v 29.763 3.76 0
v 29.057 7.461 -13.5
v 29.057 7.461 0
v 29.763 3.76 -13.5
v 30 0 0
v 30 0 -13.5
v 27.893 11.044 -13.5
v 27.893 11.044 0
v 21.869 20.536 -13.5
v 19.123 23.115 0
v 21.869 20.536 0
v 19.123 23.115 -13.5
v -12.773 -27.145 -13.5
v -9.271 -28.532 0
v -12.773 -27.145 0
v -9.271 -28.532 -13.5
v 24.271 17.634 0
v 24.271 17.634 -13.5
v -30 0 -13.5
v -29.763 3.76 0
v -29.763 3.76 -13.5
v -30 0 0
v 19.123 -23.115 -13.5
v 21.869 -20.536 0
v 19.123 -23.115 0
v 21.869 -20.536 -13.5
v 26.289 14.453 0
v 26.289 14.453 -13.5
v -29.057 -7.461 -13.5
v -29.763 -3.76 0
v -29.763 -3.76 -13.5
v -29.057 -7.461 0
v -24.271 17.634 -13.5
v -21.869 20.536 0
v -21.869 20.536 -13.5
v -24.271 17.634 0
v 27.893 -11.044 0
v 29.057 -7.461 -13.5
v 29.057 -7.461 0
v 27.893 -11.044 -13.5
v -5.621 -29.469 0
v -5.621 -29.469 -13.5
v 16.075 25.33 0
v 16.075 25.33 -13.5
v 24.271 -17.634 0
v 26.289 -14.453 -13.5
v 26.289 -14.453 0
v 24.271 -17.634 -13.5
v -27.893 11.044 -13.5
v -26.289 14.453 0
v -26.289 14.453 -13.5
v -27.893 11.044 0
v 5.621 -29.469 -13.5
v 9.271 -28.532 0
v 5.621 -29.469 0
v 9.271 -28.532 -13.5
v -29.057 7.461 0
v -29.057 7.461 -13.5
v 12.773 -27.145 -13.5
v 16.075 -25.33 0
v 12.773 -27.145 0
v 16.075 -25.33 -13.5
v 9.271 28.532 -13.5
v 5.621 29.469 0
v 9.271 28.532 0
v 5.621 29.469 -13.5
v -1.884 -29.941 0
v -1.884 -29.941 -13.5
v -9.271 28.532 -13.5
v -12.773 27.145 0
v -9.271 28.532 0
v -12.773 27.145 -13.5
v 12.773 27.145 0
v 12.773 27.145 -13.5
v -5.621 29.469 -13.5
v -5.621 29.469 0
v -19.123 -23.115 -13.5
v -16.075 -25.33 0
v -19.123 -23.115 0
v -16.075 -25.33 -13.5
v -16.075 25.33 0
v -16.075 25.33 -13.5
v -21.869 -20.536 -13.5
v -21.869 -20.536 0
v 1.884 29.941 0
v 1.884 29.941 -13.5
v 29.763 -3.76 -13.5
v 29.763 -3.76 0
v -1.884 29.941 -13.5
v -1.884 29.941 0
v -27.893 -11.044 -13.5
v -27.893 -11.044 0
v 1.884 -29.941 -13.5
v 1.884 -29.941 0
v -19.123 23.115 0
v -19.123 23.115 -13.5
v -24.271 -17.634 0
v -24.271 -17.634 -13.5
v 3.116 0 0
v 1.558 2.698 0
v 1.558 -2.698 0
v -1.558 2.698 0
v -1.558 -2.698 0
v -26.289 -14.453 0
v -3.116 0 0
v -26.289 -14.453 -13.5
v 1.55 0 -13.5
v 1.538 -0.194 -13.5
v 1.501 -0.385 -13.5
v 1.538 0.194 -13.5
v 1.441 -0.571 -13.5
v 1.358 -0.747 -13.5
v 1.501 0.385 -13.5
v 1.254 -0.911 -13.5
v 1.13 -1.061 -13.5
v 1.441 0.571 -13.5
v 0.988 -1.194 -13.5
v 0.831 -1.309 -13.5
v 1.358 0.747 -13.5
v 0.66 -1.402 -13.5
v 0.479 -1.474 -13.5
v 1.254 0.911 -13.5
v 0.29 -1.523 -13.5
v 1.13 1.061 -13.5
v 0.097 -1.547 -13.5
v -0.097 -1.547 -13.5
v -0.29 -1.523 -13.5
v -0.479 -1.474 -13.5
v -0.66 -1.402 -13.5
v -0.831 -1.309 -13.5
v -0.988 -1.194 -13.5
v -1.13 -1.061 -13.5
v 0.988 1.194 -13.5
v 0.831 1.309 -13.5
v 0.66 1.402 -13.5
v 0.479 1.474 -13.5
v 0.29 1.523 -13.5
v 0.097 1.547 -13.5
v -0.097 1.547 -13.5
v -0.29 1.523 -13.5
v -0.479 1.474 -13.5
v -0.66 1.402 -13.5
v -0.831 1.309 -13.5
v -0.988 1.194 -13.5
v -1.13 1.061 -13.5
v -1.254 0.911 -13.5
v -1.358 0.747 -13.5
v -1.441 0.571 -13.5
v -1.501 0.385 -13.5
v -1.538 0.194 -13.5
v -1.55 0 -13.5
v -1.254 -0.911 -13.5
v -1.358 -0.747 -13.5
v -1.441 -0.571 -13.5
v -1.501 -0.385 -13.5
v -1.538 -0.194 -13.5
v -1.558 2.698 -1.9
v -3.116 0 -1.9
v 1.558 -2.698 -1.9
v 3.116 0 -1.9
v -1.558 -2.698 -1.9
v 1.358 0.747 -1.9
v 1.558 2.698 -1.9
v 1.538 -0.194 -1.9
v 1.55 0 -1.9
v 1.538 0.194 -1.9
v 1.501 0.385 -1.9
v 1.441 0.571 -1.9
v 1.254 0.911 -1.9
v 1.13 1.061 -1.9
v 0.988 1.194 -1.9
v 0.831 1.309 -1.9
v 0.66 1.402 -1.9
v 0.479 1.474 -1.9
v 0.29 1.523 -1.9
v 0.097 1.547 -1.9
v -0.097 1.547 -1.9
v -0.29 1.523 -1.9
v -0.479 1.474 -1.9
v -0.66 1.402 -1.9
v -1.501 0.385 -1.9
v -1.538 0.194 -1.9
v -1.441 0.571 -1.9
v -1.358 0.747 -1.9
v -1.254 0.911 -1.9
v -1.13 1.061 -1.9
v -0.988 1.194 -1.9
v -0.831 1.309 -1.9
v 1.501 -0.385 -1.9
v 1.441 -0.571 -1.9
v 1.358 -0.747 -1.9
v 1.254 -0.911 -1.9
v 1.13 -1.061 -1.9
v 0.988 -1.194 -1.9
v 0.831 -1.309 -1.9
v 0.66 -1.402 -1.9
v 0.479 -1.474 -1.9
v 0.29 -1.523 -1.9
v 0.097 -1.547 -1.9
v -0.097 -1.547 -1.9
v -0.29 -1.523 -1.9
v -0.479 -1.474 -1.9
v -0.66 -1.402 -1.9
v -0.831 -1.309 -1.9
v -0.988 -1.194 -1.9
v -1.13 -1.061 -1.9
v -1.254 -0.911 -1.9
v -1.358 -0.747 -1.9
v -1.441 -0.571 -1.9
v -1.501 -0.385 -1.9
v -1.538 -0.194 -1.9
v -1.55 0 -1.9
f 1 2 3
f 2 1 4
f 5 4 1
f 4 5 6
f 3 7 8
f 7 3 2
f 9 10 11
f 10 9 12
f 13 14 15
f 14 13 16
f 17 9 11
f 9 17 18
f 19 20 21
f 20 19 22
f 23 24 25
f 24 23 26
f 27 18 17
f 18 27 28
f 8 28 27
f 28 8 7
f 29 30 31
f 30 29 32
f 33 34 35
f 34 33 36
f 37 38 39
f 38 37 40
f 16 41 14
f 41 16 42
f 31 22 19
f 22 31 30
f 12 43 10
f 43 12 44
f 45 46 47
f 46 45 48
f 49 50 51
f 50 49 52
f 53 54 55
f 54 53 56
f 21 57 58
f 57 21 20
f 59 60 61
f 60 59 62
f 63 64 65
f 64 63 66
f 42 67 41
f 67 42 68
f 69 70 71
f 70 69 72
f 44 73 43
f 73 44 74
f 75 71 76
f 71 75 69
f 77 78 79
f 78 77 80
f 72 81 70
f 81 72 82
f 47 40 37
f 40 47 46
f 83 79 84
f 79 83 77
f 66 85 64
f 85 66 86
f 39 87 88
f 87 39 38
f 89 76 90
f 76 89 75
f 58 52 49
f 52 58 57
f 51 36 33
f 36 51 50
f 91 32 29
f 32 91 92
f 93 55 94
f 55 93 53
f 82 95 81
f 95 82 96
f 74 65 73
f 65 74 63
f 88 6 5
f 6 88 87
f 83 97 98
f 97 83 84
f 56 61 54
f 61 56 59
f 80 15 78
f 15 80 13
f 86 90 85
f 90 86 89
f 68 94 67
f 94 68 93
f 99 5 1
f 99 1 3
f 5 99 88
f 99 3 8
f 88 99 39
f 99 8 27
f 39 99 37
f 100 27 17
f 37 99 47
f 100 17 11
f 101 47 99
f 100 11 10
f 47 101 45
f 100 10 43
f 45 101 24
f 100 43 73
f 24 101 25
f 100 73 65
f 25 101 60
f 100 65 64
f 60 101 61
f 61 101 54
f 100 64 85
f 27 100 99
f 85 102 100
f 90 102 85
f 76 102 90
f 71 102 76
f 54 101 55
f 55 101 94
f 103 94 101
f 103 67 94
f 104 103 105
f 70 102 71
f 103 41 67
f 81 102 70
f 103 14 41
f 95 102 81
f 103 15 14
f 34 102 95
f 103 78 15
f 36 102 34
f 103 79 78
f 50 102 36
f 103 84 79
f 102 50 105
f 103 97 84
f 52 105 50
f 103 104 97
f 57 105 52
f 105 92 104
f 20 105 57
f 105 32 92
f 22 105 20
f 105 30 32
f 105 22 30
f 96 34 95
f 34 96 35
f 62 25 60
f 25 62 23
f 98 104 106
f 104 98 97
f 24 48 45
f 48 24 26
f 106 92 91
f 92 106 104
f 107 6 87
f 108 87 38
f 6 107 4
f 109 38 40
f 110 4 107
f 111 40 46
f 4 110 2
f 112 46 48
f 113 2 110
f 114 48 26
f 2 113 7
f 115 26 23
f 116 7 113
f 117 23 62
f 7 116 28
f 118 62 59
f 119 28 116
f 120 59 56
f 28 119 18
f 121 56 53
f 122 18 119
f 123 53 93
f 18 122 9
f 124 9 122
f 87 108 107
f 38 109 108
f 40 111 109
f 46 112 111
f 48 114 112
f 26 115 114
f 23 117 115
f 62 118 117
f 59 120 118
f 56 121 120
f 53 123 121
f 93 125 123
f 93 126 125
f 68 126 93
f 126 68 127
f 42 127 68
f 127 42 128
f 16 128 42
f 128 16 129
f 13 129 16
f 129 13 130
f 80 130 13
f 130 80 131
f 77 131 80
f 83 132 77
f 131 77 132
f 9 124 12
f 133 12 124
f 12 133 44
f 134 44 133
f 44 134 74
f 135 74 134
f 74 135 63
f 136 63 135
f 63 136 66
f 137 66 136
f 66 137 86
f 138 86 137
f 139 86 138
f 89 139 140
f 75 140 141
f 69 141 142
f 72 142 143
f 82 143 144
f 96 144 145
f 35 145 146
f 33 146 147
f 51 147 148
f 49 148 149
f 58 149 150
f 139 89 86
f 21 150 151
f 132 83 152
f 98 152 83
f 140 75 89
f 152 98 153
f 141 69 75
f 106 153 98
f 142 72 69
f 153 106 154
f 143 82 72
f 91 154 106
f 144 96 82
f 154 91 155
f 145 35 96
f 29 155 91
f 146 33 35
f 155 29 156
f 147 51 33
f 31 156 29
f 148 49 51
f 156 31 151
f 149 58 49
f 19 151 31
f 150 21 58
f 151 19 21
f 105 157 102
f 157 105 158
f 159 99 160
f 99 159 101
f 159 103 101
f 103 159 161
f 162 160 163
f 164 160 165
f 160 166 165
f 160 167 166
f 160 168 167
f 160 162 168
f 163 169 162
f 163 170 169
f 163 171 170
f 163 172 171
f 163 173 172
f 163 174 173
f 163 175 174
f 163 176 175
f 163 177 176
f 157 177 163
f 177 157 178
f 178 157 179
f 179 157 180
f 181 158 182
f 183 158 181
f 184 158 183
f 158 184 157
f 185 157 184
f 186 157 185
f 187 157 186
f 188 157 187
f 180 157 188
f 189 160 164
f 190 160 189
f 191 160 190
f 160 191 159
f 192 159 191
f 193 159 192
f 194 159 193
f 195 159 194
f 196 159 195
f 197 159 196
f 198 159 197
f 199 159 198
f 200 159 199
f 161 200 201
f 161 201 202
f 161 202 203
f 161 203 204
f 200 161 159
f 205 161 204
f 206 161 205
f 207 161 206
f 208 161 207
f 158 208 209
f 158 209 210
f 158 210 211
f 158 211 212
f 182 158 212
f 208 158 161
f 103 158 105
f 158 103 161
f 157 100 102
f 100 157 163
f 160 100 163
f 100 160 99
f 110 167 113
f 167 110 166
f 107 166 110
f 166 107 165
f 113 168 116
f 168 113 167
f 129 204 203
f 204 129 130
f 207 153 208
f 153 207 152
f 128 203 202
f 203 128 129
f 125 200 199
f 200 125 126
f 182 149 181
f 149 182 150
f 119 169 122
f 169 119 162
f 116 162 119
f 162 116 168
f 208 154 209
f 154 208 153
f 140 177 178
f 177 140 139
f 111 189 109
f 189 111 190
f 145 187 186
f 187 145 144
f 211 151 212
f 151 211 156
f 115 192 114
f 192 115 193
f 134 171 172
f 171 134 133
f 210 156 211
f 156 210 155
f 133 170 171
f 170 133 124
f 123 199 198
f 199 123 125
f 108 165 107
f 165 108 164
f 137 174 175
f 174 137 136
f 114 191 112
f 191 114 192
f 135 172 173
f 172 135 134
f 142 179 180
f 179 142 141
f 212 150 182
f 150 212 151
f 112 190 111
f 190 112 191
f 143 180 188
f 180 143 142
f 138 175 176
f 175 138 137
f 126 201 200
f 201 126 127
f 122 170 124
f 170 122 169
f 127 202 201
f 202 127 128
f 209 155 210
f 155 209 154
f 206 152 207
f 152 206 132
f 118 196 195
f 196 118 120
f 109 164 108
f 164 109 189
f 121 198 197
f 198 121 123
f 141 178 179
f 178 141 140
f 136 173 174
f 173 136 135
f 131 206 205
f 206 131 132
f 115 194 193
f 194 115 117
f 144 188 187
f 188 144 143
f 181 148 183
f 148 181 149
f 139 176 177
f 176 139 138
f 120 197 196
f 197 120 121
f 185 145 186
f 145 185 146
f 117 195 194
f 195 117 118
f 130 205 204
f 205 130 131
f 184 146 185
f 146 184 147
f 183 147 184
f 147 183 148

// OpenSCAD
$fn = 50;


difference() {
	union() {
		translate(v = [0, 0, -13.5000000000]) {
			cylinder(h = 13.5000000000, r = 30.0000000000);
		}
		translate(v = [0, 0, -12.0000000000]) {
			cylinder(h = 12, r = 2.8750000000);
		}
	}
	union() {
		translate(v = [0, 0, 0]) {
			rotate(a = [0, 0, 0]) {
				difference() {
					union() {
						translate(v = [0, 0, -1.9000000000]) {
							linear_extrude(height = 1.9000000000) {
								polygon(points = [[3.1158000000, 0.0000000000], [1.5579000000, 2.6983619531], [-1.5579000000, 2.6983619531], [-3.1158000000, 0.0000000000], [-1.5579000000, -2.6983619531], [1.5579000000, -2.6983619531]]);
							}
						}
					}
					union();
				}
			}
		}
		#translate(v = [0, 0, -100.0000000000]) {
			cylinder(h = 200, r = 1.5500000000);
		}
	}
}
